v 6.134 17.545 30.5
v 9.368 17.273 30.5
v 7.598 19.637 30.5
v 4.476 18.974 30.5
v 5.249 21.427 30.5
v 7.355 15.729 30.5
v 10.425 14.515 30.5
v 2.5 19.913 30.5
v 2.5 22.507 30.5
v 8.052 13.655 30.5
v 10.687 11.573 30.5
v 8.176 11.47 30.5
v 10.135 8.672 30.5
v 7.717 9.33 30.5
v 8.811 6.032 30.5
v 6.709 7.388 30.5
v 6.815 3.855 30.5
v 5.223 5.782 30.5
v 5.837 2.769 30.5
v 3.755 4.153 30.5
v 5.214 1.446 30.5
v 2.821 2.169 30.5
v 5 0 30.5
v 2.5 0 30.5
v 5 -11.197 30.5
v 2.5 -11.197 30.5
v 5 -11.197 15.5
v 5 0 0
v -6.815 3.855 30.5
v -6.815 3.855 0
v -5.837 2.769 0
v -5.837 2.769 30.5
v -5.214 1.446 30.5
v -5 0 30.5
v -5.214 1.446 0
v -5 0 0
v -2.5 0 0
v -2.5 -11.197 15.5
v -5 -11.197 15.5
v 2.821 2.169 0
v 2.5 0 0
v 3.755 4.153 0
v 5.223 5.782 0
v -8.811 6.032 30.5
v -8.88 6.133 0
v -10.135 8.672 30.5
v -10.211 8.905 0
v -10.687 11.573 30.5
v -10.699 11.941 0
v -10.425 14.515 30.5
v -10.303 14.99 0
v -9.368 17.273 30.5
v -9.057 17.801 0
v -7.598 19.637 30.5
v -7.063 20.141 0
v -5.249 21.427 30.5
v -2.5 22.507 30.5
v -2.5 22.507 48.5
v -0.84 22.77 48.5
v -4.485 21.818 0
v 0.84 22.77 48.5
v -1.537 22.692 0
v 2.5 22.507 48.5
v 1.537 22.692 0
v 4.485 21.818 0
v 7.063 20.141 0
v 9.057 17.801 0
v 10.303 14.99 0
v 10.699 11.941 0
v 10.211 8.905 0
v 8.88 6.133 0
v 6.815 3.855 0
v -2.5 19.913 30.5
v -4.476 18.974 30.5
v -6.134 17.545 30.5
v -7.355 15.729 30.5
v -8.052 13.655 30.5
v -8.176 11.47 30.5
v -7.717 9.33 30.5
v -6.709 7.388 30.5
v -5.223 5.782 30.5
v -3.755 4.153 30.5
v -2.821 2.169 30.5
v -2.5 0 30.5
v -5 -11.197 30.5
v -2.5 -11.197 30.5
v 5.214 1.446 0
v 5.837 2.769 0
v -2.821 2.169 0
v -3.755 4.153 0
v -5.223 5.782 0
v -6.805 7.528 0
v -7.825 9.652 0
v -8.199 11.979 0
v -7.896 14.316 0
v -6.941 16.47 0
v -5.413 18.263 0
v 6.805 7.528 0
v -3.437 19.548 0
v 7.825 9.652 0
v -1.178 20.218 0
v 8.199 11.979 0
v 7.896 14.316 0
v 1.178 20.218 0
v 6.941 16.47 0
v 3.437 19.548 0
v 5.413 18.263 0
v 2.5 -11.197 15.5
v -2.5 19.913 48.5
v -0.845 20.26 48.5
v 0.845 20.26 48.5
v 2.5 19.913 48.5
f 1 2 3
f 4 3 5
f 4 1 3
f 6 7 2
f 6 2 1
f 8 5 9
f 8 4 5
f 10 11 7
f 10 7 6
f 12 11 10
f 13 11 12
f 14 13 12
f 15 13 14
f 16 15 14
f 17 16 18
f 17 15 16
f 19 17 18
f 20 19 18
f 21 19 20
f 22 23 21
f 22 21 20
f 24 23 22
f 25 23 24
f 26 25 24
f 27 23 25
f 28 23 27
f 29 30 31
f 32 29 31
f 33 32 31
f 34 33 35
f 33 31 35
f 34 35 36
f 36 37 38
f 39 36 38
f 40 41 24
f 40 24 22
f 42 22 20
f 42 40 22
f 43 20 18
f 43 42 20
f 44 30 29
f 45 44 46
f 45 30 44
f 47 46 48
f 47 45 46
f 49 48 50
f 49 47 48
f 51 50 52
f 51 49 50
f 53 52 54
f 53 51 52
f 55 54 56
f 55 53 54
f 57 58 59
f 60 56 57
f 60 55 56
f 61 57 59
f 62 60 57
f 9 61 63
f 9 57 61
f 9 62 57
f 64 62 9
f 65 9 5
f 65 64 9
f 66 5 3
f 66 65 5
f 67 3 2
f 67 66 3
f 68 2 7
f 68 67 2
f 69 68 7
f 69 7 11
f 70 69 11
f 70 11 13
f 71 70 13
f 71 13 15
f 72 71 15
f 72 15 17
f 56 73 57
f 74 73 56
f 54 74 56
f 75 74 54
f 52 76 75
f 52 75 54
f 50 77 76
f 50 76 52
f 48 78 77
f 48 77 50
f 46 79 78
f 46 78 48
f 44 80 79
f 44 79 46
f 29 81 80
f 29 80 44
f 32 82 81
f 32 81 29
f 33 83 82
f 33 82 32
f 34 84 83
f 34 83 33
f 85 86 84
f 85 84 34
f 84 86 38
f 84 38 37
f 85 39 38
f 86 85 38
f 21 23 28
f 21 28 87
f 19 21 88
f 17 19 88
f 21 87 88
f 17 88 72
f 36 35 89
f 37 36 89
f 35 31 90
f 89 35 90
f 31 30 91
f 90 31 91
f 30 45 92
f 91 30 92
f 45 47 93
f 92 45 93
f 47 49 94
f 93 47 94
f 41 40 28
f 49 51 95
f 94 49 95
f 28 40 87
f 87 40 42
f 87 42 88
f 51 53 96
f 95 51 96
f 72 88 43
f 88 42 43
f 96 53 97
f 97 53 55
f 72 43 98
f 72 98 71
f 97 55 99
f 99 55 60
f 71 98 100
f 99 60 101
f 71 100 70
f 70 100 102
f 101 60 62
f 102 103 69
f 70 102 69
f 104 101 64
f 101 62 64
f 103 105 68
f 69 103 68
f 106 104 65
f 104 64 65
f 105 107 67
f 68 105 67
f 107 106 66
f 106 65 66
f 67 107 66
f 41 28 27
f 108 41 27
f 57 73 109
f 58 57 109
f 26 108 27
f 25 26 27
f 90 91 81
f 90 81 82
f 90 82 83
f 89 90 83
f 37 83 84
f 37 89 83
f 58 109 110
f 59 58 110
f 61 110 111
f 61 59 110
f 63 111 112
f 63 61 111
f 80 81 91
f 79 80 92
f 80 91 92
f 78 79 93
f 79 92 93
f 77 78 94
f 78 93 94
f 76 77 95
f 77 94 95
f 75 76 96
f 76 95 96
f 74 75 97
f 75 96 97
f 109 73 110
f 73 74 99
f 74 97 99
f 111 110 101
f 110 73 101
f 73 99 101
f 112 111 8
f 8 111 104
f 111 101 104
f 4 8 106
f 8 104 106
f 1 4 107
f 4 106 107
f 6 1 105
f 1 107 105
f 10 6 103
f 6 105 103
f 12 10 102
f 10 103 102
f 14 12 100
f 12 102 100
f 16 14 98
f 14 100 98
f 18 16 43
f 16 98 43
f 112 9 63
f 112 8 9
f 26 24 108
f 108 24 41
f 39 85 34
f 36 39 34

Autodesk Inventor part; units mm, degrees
ref_plane "YZ Plane" through (0, 0, 0) normal (1, 0, 0) x (0, 1, 0)
ref_plane "XZ Plane" through (0, 0, 0) normal (0, 1, 0) x (-1, 0, 0)
ref_plane "XY Plane" through (0, 0, 0) normal (0, 0, 1) x (1, 0, 0)
sketch "Sketch1" plane through (0, 0, 0) normal (0, 0, 1) x (1, 0, 0)
  line L0 (-5, -11.1967) -> (-5, 0)
  arc A0 (-5, 0) -> (-6.8153, 3.8546) centre (-10, 0) ccw
  arc A1 (6.8153, 3.8546) -> (-6.8153, 3.8546) centre (0, 12.1033) ccw
  arc A2 (6.8153, 3.8546) -> (5, 0) centre (10, 0) ccw
  line L1 (5, 0) -> (5, -11.1967)
  line L2 (-2.5, -11.1967) -> (-2.5, 0)
  arc A3 (-2.5, 0) -> (-5.2229, 5.7818) centre (-10, 0) ccw
  arc A4 (5.2229, 5.7818) -> (-5.2229, 5.7818) centre (0, 12.1033) ccw
  arc A5 (5.2229, 5.7818) -> (2.5, 0) centre (10, 0) ccw
  line L3 (2.5, 0) -> (2.5, -11.1967)
  line L4 (-5, -11.1967) -> (-2.5, -11.1967)
  line L5 (2.5, -11.1967) -> (5, -11.1967)
  point P0 (0, 0)
  dimension "d2" = 10.7
  dimension "d4" = 10
  dimension "d5" = 5
  dimension "d7" = 2.5
  dimension "d16" = 34
extrude "Extrusion1" add sketch "Sketch1" along normal blind 48.5
sketch "Sketch2" plane through (-5, -11.1967, 0) normal (0, -1, 0) x (1, 0, 0)
  line L0 (2.5, 0) -> (0, 0) projected
  line L1 (2.5, 0) -> (2.5, 48.5) projected
  line L2 (0, 48.5) -> (2.5, 48.5) projected
  line L3 (0, 0) -> (0, 48.5) projected
  line L4 (10, 0) -> (7.5, 0) projected
  line L5 (10, 0) -> (10, 48.5) projected
  line L6 (7.5, 48.5) -> (10, 48.5) projected
  line L7 (7.5, 0) -> (7.5, 48.5) projected
  line L8 (-5.7, 0) -> (-5.7, 48.5) projected
  line L9 (15.7, 0) -> (15.7, 48.5) projected
  line L10 (-5.7, 48.5) -> (2.5, 48.5)
  line L11 (2.5, 48.5) -> (2.5, 30.5)
  line L12 (2.5, 30.5) -> (-5.7, 30.5)
  line L13 (-5.7, 30.5) -> (-5.7, 48.5)
  line L14 (7.5, 48.5) -> (15.7, 48.5)
  line L15 (15.7, 48.5) -> (15.7, 30.5)
  line L16 (15.7, 30.5) -> (7.5, 30.5)
  line L17 (7.5, 30.5) -> (7.5, 48.5)
  point P0 (5, 0)
  point P1 (-1.6, 30.5)
  dimension "d10" = 18
extrude "Extrusion2" cut sketch "Sketch2" against normal blind 48.5 contours L12 L3 L2 L1 | L12 L8 L10 L3 | L16 L7 L6 L5 | L5 L14 L9 L16
sketch "Sketch3" plane through (5, -11.1967, 0) normal (1, 0, 0) x (0, 0, -1)
  line L0 (0, 0) -> (0, 11.1967)
  line L1 (0, 11.1967) -> (-15.5, 0)
  line L2 (-15.5, 0) -> (0, 0)
  line L3 (0, 11.1967) -> (0, 0) projected
  line L4 (0, 0) -> (-30.5, 0) projected
  dimension "d18" = 15.5
extrude "Extrusion3" cut sketch "Sketch3" against normal blind 48.5
equation "\"BendRadius\" = Thickness"
equation "\"BendReliefWidth\" = Thickness"
equation "\"BendReliefDepth\" = 0.5 * Thickness"
equation "\"MinimumRemnant\" = 2 * Thickness"
equation "\"TransitionRadius\" = BendRadius"
equation "\"JacobiRadiusSize\" = BendRadius"
equation "\"GapSize\" = Thickness"
equation "\"Thickness\" = 2.5"
properties material "Iron, Gray"
